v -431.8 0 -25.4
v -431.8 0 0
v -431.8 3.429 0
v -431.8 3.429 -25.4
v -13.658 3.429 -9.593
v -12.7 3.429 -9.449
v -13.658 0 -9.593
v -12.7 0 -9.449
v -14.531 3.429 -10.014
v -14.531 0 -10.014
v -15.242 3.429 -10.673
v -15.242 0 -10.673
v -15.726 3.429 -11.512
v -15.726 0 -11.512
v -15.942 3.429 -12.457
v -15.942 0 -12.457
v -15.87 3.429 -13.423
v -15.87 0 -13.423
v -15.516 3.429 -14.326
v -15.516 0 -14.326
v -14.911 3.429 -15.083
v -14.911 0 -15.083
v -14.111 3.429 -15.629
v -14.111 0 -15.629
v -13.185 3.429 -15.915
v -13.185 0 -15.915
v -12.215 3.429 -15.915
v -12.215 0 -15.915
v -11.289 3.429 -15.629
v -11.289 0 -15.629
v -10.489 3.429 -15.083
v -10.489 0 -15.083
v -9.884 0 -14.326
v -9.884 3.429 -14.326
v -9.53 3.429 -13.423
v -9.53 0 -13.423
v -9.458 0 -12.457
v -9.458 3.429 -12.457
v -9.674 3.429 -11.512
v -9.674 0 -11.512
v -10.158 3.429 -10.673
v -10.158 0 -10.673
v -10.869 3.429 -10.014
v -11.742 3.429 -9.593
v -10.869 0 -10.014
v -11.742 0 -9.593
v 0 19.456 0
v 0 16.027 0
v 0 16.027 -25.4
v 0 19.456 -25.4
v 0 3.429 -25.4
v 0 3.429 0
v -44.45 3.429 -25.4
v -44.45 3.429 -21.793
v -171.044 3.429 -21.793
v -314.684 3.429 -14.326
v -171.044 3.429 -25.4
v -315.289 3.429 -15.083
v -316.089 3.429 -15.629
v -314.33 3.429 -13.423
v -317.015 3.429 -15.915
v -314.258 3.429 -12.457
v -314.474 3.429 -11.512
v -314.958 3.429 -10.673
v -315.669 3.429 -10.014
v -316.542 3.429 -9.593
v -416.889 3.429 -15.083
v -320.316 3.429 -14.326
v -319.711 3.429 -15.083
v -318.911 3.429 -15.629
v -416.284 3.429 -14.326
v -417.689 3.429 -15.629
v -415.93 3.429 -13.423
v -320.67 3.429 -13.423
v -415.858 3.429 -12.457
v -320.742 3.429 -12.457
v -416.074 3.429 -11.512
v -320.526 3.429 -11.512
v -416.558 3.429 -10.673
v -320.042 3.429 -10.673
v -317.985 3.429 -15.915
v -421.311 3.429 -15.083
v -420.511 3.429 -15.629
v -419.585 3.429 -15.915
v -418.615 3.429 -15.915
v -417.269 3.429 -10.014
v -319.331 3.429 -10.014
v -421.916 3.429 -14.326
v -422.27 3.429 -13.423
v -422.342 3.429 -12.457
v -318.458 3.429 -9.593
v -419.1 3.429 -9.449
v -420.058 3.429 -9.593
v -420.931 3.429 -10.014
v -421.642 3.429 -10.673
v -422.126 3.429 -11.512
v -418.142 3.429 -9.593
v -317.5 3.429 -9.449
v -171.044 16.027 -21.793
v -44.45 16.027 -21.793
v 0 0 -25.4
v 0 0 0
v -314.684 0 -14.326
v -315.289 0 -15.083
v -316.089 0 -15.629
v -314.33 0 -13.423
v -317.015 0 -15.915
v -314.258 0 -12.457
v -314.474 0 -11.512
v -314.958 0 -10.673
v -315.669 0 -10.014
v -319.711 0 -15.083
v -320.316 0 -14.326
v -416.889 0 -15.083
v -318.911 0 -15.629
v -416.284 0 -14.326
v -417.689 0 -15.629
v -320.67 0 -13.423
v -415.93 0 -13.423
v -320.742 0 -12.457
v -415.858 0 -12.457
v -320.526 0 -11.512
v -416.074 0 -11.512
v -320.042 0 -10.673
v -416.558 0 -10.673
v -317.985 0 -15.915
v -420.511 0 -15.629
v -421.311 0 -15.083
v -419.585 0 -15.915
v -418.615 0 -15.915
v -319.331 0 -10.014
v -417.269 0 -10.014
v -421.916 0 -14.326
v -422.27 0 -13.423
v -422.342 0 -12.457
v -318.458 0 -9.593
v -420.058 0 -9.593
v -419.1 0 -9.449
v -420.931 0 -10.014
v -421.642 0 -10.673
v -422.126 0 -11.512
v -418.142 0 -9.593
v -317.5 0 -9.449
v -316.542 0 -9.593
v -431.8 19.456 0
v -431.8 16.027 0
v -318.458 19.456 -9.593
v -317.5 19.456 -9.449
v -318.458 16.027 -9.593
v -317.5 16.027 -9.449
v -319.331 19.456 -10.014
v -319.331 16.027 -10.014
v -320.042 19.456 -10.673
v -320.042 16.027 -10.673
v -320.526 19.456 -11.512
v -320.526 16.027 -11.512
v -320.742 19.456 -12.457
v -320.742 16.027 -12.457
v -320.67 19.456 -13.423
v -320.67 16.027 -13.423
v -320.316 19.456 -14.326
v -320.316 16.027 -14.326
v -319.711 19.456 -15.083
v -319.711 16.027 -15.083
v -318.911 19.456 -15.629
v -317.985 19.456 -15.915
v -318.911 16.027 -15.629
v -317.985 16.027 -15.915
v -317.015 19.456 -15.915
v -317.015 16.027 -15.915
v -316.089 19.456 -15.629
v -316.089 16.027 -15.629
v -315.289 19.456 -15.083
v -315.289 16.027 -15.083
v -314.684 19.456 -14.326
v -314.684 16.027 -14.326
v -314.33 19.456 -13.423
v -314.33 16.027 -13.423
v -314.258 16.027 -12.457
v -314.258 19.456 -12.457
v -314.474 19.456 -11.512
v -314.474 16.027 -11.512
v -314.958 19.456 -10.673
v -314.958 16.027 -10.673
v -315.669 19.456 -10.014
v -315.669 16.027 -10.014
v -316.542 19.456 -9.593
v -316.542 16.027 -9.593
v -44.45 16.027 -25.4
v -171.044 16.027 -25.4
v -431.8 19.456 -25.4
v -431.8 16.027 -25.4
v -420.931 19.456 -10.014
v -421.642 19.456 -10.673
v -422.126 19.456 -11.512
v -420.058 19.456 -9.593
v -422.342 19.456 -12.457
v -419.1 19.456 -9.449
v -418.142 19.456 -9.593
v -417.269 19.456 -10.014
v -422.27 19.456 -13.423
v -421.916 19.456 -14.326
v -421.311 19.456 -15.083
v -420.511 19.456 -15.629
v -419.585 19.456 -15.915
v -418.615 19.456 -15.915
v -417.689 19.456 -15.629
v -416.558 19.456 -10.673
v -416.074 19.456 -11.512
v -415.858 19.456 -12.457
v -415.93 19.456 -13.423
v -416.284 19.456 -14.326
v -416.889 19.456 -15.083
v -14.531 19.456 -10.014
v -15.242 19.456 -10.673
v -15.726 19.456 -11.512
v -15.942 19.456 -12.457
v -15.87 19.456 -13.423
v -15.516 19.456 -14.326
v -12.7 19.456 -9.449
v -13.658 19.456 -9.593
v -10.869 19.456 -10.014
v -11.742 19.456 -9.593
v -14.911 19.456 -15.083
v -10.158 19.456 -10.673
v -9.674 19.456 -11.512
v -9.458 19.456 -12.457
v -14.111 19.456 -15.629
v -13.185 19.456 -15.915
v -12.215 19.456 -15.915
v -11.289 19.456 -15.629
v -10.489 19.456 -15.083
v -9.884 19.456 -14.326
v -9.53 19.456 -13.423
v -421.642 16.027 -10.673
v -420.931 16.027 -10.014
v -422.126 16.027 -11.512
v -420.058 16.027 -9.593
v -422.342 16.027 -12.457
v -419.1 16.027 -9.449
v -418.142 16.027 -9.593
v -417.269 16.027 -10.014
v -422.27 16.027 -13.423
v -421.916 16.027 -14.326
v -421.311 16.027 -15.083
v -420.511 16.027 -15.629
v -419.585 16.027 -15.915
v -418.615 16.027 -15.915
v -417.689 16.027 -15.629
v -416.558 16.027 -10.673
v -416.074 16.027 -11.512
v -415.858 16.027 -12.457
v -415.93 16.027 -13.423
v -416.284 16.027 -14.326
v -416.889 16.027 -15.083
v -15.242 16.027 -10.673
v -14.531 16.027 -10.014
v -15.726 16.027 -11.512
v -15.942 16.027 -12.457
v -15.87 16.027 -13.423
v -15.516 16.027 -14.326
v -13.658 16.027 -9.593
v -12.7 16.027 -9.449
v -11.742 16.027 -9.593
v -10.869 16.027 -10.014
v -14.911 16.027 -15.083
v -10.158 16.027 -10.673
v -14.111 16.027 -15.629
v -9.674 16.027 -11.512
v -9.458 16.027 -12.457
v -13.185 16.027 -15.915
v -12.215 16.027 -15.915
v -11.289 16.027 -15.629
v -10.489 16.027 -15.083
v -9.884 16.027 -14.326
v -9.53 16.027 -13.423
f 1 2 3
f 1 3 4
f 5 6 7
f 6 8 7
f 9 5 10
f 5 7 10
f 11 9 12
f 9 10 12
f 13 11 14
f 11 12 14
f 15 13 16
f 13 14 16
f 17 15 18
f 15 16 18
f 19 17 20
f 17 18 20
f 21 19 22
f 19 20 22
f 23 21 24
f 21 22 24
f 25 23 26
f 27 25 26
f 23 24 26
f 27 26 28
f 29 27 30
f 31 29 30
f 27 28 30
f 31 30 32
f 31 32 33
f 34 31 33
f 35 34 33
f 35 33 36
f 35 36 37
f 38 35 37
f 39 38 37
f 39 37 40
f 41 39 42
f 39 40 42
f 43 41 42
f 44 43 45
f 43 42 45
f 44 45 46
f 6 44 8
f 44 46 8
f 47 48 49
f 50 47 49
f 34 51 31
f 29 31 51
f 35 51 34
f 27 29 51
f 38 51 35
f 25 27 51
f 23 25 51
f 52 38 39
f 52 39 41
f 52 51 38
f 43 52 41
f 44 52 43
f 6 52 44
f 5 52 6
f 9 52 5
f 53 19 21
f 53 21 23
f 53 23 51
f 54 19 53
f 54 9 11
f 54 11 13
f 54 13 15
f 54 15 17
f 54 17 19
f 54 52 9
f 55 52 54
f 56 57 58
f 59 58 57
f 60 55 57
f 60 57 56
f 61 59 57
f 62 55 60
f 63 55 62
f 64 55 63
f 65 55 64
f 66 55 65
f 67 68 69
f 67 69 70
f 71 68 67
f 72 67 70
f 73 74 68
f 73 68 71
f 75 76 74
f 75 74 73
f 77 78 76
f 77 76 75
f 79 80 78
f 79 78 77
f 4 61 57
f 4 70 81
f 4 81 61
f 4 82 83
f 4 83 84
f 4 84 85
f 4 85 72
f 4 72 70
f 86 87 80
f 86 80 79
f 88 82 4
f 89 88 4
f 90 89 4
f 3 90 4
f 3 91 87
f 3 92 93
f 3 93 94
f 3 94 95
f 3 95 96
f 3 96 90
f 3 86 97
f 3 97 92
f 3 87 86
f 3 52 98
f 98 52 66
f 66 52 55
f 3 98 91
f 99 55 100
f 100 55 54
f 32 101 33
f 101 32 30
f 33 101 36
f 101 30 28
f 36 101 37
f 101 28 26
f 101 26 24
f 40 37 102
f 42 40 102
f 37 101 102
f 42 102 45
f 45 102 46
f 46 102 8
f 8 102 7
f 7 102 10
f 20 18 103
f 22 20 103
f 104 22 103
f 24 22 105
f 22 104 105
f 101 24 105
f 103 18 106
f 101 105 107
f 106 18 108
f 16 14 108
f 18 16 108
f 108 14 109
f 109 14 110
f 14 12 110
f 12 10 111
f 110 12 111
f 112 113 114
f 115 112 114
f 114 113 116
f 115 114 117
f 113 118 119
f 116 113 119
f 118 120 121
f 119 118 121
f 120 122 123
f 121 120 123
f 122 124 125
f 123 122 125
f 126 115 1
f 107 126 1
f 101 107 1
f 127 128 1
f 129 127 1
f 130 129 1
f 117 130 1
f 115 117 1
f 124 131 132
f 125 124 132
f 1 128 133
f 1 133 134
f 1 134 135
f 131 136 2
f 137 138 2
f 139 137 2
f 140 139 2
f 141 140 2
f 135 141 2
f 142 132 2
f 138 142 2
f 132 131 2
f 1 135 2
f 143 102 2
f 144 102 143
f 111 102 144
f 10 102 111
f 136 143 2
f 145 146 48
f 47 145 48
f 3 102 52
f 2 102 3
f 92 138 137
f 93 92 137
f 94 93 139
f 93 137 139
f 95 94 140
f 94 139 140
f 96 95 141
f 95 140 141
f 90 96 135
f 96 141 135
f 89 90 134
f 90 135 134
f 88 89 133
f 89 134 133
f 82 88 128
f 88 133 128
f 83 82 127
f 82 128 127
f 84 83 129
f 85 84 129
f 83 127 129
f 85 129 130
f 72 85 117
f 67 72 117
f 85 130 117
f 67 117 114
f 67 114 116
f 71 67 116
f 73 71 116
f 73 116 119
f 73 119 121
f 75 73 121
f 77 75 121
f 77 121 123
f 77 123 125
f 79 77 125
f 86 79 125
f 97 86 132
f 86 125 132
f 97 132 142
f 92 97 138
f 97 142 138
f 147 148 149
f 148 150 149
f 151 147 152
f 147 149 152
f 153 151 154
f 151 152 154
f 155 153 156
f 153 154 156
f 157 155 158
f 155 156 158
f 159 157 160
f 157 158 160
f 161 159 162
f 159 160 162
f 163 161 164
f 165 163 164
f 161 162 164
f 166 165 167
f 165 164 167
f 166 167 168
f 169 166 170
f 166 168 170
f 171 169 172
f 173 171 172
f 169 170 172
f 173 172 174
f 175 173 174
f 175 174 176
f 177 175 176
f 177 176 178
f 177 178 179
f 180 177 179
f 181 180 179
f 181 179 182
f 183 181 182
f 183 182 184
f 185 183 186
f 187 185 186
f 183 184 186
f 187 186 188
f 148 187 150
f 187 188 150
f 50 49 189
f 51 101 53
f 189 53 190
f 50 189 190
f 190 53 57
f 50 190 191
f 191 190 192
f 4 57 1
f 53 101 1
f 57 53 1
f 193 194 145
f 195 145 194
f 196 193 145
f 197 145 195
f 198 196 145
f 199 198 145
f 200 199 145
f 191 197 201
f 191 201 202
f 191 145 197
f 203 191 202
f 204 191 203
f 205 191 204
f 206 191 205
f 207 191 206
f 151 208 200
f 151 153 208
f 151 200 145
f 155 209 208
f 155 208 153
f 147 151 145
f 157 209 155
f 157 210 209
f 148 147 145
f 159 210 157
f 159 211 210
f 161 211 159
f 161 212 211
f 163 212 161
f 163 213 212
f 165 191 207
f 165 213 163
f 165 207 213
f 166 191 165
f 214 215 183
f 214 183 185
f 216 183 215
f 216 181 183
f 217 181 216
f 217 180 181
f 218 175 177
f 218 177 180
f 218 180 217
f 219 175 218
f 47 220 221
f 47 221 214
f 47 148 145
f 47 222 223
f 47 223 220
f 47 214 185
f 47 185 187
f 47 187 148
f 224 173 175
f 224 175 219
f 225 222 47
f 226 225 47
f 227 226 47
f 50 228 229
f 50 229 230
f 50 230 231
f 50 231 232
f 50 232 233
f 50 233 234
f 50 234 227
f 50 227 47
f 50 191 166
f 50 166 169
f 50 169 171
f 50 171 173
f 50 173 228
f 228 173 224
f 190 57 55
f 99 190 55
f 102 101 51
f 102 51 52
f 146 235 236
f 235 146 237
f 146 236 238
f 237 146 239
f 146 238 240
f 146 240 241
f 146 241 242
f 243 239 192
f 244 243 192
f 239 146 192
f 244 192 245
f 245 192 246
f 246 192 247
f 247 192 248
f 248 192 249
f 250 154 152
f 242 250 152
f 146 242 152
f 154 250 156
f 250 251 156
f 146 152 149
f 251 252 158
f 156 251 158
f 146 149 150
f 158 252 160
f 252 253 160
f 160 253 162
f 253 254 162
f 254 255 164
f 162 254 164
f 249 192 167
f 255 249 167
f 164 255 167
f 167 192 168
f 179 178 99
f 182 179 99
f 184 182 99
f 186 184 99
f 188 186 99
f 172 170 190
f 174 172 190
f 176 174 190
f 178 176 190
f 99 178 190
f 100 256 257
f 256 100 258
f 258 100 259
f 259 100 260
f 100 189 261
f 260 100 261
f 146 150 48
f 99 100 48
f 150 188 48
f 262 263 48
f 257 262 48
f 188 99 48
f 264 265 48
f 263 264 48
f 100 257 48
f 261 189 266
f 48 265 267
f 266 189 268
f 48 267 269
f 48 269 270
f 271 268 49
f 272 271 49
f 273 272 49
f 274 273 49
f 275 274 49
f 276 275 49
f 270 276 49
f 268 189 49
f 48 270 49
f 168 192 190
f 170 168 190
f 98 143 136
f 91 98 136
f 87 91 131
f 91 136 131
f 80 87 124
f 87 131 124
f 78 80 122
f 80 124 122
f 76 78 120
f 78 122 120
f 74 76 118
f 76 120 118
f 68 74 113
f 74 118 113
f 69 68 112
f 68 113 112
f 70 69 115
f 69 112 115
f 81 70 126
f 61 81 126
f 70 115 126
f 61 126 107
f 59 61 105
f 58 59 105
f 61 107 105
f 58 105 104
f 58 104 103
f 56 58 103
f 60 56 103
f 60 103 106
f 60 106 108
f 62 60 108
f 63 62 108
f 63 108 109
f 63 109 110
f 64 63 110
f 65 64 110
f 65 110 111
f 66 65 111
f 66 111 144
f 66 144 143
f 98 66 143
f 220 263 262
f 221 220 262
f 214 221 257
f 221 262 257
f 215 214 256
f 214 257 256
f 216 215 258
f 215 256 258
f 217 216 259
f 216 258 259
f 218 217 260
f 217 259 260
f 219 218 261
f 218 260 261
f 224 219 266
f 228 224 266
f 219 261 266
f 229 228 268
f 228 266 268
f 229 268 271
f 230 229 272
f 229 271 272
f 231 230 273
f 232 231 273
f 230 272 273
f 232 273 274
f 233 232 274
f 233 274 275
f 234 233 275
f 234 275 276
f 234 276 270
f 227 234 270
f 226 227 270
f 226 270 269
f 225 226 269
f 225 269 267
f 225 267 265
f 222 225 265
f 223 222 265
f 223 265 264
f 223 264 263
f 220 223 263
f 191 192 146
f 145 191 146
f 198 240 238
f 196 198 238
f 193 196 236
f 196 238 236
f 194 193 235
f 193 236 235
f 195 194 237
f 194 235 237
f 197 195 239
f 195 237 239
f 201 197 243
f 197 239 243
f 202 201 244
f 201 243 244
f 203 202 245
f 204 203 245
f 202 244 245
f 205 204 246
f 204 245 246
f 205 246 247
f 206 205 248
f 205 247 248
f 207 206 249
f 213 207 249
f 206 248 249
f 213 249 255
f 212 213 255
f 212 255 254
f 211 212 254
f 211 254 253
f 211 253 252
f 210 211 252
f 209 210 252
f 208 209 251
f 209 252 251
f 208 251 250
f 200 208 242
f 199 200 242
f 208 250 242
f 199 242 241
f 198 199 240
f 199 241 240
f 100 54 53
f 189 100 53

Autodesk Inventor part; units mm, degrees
ref_plane "YZ Plane" through (0, 0, 0) normal (1, 0, 0) x (0, 1, 0)
ref_plane "XZ Plane" through (0, 0, 0) normal (0, 1, 0) x (-1, 0, 0)
ref_plane "XY Plane" through (0, 0, 0) normal (0, 0, 1) x (1, 0, 0)
sketch "Sketch1" plane through (0, 0, 0) normal (0, 1, 0) x (-1, 0, 0)
  line L0 (0, 0) -> (431.8, 0)
  line L1 (431.8, 0) -> (431.8, -25.4)
  line L2 (431.8, -25.4) -> (0, -25.4)
  line L3 (0, -25.4) -> (0, 0)
  dimension "d0" = 431.8
  dimension "d1" = 25.4
extrude "Extrusion1" add sketch "Sketch1" along normal blind 3.429
sketch "Sketch2" plane through (0, 3.429, 0) normal (0, 1, 0) x (1, 0, 0)
  line L0 (0, 25.4) -> (-431.8, 25.4) projected
  line L1 (-44.45, 25.4) -> (-171.0436, 25.4)
  line L2 (-171.0436, 25.4) -> (-171.0436, 21.7932)
  line L3 (-171.0436, 21.7932) -> (-44.45, 21.7932)
  line L4 (-44.45, 21.7932) -> (-44.45, 25.4)
  line L5 (0, 0) -> (0, 25.4) projected
  point P0 (-44.45, 23.5966)
  dimension "d4" = 126.5936
  dimension "d5" = 3.6068
  dimension "d6" = 44.45
extrude "Extrusion2" add sketch "Sketch2" along normal blind 12.5984
sketch "Sketch3" plane through (0, 16.0274, 0) normal (0, 1, 0) x (1, 0, 0)
  line L0 (-431.8, 0) -> (0, 0)
  line L1 (0, 0) -> (0, 25.4)
  line L2 (0, 25.4) -> (-431.8, 25.4)
  line L3 (-431.8, 25.4) -> (-431.8, 0)
extrude "Extrusion3" add sketch "Sketch3" along normal blind 3.429
sketch "Sketch4" plane through (0, 19.4564, 0) normal (0, 1, 0) x (1, 0, 0)
  line L0 (0, 25.4) -> (-431.8, 25.4) projected
  line L1 (0, 0) -> (0, 25.4) projected
  line L2 (-431.8, 25.4) -> (-431.8, 0) projected
  point P0 (-12.7, 12.7)
  point P1 (-419.1, 12.7)
  point P2 (-317.5, 12.7)
  dimension "d11" = 12.7
  dimension "d12" = 12.7
  dimension "d13" = 12.7
  dimension "d14" = 12.7
  dimension "d15" = 12.7
  dimension "d24" = 114.3
hole "Hole1" at (-12.7, 19.4564, -12.7) at (-419.1, 19.4564, -12.7) at (-317.5, 19.4564, -12.7) direction (0, -1, 0) diameter 6.5024 end through all
sketch "Sketch5" plane through (0, 19.4564, 0) normal (0, 1, 0) x (1, 0, 0)
  point P0 (0, 0)
properties part number "ArmPart2.1"
